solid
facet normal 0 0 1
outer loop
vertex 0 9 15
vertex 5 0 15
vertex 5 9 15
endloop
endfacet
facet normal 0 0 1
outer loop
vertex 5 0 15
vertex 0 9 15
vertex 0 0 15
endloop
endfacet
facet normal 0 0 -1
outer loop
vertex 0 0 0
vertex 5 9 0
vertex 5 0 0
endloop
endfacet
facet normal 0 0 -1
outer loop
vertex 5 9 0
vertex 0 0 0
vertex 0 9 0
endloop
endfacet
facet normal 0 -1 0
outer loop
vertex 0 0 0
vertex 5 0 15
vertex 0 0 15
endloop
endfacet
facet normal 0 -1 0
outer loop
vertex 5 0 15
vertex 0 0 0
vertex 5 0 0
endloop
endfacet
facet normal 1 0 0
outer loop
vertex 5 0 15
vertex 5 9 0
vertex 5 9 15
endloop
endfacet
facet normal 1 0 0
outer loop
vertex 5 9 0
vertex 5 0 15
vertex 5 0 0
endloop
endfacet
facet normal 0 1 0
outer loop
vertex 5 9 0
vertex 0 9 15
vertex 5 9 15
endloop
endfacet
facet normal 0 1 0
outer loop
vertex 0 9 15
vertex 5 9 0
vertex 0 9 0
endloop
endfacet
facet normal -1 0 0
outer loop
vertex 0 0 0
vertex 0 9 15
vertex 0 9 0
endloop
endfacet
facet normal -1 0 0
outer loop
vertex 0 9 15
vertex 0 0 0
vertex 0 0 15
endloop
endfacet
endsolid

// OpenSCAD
// Generated by SolidPython 1.0.1 on 2020-07-29 00:39:26


cube(size = [5, 9, 15]);
/***********************************************
*********      SolidPython code:      **********
************************************************
 
# import packages: SolidPython
from solid import *
from solid.utils import *
from itertools import chain, combinations


class Resize:

    def __init__(self, scad_file):
        self.scad_file = scad_file
        #self.scad_file = import_scad(scad_file)
        # cone/cylinder param:
        self.r1 = 0
        self.r2 = 0
        self.h = 0
        # rectangular prism param:
        self.w = 0
        self.l = 0
        # ellipse param:
        self.r = 0

    # import OpenScad code (file name corresponds to shape)


    # classify shape + parameters
    def assign(self, param1, param2, param3):
        if self.scad_file == 'cone.scad':
            self.r1 = param1
            self.r2 = param2
            self.h = param3
        elif self.scad_file == 'cylinder.scad':
            self.r1 = param1
            self.r2 = param2
            self.h = param3
        elif self.scad_file == 'rectangularPrism.scad':
            self.h = param1
            self.l = param2
            self.w = param3
        else:
            self.r = param1
            self.h = param2

    # resize parameters
    def iterate(self):
        x = range(3, 20, 2)
        i = 1
        if self.scad_file == 'cone.scad':
            tempList = list(combinations(x, 2))
            for temp in tempList:
                param1 = temp[0]
                param2 = temp[1]
                filepath = 'produced_scad_files/' + 'cone' + str(param1) + '_' + str(param2) + '_' + '.scad'
                scad_render_to_file(cylinder(h=param1, r1=param2, r2=0), filepath)

        elif self.scad_file == 'cylinder.scad':
            tempList = list(combinations(x, 3))
            for temp in tempList:
                param1 = temp[0]
                param2 = temp[1]
                filepath = 'produced_scad_files/' + 'cylinder' + str(param1) + '_' + str(param2) + '_' + '.scad'
                scad_render_to_file(cylinder(h=param1, r1=param2, r2=param2), filepath)

        elif self.scad_file == 'rectangularPrism.scad':
            tempList = list(combinations(x, 3))
            for temp in tempList:
                param1 = temp[0]
                param2 = temp[1]
                param3 = temp[2]
                filepath = 'produced_scad_files/' + 'rectangularPrism' + str(param1) + '_' + str(param2) + '_' + str(
                    param3) + '.scad'
                scad_render_to_file(cube(size=(param1, param2, param3)), filepath)

        elif self.scad_file == 'ellipse.scad':
            tempList = list(combinations(x, 4))
            for temp in tempList:
                param1 = temp[0]
                param2 = temp[1]
                param3 = temp[2]
                param4 = temp[3]
                filepath = 'produced_scad_files/' + 'ellipse' + str(param1) + '_' + str(param2) + '_' + str(param3) + '_' + str(param4) + '.scad'
                scad_render_to_file(scale([param1, param2, param3])(sphere(r=param4)), filepath)

    def render_to_scadfile(self):
        scad_render_to_file(scad, 'example.scad') 
 
************************************************/
